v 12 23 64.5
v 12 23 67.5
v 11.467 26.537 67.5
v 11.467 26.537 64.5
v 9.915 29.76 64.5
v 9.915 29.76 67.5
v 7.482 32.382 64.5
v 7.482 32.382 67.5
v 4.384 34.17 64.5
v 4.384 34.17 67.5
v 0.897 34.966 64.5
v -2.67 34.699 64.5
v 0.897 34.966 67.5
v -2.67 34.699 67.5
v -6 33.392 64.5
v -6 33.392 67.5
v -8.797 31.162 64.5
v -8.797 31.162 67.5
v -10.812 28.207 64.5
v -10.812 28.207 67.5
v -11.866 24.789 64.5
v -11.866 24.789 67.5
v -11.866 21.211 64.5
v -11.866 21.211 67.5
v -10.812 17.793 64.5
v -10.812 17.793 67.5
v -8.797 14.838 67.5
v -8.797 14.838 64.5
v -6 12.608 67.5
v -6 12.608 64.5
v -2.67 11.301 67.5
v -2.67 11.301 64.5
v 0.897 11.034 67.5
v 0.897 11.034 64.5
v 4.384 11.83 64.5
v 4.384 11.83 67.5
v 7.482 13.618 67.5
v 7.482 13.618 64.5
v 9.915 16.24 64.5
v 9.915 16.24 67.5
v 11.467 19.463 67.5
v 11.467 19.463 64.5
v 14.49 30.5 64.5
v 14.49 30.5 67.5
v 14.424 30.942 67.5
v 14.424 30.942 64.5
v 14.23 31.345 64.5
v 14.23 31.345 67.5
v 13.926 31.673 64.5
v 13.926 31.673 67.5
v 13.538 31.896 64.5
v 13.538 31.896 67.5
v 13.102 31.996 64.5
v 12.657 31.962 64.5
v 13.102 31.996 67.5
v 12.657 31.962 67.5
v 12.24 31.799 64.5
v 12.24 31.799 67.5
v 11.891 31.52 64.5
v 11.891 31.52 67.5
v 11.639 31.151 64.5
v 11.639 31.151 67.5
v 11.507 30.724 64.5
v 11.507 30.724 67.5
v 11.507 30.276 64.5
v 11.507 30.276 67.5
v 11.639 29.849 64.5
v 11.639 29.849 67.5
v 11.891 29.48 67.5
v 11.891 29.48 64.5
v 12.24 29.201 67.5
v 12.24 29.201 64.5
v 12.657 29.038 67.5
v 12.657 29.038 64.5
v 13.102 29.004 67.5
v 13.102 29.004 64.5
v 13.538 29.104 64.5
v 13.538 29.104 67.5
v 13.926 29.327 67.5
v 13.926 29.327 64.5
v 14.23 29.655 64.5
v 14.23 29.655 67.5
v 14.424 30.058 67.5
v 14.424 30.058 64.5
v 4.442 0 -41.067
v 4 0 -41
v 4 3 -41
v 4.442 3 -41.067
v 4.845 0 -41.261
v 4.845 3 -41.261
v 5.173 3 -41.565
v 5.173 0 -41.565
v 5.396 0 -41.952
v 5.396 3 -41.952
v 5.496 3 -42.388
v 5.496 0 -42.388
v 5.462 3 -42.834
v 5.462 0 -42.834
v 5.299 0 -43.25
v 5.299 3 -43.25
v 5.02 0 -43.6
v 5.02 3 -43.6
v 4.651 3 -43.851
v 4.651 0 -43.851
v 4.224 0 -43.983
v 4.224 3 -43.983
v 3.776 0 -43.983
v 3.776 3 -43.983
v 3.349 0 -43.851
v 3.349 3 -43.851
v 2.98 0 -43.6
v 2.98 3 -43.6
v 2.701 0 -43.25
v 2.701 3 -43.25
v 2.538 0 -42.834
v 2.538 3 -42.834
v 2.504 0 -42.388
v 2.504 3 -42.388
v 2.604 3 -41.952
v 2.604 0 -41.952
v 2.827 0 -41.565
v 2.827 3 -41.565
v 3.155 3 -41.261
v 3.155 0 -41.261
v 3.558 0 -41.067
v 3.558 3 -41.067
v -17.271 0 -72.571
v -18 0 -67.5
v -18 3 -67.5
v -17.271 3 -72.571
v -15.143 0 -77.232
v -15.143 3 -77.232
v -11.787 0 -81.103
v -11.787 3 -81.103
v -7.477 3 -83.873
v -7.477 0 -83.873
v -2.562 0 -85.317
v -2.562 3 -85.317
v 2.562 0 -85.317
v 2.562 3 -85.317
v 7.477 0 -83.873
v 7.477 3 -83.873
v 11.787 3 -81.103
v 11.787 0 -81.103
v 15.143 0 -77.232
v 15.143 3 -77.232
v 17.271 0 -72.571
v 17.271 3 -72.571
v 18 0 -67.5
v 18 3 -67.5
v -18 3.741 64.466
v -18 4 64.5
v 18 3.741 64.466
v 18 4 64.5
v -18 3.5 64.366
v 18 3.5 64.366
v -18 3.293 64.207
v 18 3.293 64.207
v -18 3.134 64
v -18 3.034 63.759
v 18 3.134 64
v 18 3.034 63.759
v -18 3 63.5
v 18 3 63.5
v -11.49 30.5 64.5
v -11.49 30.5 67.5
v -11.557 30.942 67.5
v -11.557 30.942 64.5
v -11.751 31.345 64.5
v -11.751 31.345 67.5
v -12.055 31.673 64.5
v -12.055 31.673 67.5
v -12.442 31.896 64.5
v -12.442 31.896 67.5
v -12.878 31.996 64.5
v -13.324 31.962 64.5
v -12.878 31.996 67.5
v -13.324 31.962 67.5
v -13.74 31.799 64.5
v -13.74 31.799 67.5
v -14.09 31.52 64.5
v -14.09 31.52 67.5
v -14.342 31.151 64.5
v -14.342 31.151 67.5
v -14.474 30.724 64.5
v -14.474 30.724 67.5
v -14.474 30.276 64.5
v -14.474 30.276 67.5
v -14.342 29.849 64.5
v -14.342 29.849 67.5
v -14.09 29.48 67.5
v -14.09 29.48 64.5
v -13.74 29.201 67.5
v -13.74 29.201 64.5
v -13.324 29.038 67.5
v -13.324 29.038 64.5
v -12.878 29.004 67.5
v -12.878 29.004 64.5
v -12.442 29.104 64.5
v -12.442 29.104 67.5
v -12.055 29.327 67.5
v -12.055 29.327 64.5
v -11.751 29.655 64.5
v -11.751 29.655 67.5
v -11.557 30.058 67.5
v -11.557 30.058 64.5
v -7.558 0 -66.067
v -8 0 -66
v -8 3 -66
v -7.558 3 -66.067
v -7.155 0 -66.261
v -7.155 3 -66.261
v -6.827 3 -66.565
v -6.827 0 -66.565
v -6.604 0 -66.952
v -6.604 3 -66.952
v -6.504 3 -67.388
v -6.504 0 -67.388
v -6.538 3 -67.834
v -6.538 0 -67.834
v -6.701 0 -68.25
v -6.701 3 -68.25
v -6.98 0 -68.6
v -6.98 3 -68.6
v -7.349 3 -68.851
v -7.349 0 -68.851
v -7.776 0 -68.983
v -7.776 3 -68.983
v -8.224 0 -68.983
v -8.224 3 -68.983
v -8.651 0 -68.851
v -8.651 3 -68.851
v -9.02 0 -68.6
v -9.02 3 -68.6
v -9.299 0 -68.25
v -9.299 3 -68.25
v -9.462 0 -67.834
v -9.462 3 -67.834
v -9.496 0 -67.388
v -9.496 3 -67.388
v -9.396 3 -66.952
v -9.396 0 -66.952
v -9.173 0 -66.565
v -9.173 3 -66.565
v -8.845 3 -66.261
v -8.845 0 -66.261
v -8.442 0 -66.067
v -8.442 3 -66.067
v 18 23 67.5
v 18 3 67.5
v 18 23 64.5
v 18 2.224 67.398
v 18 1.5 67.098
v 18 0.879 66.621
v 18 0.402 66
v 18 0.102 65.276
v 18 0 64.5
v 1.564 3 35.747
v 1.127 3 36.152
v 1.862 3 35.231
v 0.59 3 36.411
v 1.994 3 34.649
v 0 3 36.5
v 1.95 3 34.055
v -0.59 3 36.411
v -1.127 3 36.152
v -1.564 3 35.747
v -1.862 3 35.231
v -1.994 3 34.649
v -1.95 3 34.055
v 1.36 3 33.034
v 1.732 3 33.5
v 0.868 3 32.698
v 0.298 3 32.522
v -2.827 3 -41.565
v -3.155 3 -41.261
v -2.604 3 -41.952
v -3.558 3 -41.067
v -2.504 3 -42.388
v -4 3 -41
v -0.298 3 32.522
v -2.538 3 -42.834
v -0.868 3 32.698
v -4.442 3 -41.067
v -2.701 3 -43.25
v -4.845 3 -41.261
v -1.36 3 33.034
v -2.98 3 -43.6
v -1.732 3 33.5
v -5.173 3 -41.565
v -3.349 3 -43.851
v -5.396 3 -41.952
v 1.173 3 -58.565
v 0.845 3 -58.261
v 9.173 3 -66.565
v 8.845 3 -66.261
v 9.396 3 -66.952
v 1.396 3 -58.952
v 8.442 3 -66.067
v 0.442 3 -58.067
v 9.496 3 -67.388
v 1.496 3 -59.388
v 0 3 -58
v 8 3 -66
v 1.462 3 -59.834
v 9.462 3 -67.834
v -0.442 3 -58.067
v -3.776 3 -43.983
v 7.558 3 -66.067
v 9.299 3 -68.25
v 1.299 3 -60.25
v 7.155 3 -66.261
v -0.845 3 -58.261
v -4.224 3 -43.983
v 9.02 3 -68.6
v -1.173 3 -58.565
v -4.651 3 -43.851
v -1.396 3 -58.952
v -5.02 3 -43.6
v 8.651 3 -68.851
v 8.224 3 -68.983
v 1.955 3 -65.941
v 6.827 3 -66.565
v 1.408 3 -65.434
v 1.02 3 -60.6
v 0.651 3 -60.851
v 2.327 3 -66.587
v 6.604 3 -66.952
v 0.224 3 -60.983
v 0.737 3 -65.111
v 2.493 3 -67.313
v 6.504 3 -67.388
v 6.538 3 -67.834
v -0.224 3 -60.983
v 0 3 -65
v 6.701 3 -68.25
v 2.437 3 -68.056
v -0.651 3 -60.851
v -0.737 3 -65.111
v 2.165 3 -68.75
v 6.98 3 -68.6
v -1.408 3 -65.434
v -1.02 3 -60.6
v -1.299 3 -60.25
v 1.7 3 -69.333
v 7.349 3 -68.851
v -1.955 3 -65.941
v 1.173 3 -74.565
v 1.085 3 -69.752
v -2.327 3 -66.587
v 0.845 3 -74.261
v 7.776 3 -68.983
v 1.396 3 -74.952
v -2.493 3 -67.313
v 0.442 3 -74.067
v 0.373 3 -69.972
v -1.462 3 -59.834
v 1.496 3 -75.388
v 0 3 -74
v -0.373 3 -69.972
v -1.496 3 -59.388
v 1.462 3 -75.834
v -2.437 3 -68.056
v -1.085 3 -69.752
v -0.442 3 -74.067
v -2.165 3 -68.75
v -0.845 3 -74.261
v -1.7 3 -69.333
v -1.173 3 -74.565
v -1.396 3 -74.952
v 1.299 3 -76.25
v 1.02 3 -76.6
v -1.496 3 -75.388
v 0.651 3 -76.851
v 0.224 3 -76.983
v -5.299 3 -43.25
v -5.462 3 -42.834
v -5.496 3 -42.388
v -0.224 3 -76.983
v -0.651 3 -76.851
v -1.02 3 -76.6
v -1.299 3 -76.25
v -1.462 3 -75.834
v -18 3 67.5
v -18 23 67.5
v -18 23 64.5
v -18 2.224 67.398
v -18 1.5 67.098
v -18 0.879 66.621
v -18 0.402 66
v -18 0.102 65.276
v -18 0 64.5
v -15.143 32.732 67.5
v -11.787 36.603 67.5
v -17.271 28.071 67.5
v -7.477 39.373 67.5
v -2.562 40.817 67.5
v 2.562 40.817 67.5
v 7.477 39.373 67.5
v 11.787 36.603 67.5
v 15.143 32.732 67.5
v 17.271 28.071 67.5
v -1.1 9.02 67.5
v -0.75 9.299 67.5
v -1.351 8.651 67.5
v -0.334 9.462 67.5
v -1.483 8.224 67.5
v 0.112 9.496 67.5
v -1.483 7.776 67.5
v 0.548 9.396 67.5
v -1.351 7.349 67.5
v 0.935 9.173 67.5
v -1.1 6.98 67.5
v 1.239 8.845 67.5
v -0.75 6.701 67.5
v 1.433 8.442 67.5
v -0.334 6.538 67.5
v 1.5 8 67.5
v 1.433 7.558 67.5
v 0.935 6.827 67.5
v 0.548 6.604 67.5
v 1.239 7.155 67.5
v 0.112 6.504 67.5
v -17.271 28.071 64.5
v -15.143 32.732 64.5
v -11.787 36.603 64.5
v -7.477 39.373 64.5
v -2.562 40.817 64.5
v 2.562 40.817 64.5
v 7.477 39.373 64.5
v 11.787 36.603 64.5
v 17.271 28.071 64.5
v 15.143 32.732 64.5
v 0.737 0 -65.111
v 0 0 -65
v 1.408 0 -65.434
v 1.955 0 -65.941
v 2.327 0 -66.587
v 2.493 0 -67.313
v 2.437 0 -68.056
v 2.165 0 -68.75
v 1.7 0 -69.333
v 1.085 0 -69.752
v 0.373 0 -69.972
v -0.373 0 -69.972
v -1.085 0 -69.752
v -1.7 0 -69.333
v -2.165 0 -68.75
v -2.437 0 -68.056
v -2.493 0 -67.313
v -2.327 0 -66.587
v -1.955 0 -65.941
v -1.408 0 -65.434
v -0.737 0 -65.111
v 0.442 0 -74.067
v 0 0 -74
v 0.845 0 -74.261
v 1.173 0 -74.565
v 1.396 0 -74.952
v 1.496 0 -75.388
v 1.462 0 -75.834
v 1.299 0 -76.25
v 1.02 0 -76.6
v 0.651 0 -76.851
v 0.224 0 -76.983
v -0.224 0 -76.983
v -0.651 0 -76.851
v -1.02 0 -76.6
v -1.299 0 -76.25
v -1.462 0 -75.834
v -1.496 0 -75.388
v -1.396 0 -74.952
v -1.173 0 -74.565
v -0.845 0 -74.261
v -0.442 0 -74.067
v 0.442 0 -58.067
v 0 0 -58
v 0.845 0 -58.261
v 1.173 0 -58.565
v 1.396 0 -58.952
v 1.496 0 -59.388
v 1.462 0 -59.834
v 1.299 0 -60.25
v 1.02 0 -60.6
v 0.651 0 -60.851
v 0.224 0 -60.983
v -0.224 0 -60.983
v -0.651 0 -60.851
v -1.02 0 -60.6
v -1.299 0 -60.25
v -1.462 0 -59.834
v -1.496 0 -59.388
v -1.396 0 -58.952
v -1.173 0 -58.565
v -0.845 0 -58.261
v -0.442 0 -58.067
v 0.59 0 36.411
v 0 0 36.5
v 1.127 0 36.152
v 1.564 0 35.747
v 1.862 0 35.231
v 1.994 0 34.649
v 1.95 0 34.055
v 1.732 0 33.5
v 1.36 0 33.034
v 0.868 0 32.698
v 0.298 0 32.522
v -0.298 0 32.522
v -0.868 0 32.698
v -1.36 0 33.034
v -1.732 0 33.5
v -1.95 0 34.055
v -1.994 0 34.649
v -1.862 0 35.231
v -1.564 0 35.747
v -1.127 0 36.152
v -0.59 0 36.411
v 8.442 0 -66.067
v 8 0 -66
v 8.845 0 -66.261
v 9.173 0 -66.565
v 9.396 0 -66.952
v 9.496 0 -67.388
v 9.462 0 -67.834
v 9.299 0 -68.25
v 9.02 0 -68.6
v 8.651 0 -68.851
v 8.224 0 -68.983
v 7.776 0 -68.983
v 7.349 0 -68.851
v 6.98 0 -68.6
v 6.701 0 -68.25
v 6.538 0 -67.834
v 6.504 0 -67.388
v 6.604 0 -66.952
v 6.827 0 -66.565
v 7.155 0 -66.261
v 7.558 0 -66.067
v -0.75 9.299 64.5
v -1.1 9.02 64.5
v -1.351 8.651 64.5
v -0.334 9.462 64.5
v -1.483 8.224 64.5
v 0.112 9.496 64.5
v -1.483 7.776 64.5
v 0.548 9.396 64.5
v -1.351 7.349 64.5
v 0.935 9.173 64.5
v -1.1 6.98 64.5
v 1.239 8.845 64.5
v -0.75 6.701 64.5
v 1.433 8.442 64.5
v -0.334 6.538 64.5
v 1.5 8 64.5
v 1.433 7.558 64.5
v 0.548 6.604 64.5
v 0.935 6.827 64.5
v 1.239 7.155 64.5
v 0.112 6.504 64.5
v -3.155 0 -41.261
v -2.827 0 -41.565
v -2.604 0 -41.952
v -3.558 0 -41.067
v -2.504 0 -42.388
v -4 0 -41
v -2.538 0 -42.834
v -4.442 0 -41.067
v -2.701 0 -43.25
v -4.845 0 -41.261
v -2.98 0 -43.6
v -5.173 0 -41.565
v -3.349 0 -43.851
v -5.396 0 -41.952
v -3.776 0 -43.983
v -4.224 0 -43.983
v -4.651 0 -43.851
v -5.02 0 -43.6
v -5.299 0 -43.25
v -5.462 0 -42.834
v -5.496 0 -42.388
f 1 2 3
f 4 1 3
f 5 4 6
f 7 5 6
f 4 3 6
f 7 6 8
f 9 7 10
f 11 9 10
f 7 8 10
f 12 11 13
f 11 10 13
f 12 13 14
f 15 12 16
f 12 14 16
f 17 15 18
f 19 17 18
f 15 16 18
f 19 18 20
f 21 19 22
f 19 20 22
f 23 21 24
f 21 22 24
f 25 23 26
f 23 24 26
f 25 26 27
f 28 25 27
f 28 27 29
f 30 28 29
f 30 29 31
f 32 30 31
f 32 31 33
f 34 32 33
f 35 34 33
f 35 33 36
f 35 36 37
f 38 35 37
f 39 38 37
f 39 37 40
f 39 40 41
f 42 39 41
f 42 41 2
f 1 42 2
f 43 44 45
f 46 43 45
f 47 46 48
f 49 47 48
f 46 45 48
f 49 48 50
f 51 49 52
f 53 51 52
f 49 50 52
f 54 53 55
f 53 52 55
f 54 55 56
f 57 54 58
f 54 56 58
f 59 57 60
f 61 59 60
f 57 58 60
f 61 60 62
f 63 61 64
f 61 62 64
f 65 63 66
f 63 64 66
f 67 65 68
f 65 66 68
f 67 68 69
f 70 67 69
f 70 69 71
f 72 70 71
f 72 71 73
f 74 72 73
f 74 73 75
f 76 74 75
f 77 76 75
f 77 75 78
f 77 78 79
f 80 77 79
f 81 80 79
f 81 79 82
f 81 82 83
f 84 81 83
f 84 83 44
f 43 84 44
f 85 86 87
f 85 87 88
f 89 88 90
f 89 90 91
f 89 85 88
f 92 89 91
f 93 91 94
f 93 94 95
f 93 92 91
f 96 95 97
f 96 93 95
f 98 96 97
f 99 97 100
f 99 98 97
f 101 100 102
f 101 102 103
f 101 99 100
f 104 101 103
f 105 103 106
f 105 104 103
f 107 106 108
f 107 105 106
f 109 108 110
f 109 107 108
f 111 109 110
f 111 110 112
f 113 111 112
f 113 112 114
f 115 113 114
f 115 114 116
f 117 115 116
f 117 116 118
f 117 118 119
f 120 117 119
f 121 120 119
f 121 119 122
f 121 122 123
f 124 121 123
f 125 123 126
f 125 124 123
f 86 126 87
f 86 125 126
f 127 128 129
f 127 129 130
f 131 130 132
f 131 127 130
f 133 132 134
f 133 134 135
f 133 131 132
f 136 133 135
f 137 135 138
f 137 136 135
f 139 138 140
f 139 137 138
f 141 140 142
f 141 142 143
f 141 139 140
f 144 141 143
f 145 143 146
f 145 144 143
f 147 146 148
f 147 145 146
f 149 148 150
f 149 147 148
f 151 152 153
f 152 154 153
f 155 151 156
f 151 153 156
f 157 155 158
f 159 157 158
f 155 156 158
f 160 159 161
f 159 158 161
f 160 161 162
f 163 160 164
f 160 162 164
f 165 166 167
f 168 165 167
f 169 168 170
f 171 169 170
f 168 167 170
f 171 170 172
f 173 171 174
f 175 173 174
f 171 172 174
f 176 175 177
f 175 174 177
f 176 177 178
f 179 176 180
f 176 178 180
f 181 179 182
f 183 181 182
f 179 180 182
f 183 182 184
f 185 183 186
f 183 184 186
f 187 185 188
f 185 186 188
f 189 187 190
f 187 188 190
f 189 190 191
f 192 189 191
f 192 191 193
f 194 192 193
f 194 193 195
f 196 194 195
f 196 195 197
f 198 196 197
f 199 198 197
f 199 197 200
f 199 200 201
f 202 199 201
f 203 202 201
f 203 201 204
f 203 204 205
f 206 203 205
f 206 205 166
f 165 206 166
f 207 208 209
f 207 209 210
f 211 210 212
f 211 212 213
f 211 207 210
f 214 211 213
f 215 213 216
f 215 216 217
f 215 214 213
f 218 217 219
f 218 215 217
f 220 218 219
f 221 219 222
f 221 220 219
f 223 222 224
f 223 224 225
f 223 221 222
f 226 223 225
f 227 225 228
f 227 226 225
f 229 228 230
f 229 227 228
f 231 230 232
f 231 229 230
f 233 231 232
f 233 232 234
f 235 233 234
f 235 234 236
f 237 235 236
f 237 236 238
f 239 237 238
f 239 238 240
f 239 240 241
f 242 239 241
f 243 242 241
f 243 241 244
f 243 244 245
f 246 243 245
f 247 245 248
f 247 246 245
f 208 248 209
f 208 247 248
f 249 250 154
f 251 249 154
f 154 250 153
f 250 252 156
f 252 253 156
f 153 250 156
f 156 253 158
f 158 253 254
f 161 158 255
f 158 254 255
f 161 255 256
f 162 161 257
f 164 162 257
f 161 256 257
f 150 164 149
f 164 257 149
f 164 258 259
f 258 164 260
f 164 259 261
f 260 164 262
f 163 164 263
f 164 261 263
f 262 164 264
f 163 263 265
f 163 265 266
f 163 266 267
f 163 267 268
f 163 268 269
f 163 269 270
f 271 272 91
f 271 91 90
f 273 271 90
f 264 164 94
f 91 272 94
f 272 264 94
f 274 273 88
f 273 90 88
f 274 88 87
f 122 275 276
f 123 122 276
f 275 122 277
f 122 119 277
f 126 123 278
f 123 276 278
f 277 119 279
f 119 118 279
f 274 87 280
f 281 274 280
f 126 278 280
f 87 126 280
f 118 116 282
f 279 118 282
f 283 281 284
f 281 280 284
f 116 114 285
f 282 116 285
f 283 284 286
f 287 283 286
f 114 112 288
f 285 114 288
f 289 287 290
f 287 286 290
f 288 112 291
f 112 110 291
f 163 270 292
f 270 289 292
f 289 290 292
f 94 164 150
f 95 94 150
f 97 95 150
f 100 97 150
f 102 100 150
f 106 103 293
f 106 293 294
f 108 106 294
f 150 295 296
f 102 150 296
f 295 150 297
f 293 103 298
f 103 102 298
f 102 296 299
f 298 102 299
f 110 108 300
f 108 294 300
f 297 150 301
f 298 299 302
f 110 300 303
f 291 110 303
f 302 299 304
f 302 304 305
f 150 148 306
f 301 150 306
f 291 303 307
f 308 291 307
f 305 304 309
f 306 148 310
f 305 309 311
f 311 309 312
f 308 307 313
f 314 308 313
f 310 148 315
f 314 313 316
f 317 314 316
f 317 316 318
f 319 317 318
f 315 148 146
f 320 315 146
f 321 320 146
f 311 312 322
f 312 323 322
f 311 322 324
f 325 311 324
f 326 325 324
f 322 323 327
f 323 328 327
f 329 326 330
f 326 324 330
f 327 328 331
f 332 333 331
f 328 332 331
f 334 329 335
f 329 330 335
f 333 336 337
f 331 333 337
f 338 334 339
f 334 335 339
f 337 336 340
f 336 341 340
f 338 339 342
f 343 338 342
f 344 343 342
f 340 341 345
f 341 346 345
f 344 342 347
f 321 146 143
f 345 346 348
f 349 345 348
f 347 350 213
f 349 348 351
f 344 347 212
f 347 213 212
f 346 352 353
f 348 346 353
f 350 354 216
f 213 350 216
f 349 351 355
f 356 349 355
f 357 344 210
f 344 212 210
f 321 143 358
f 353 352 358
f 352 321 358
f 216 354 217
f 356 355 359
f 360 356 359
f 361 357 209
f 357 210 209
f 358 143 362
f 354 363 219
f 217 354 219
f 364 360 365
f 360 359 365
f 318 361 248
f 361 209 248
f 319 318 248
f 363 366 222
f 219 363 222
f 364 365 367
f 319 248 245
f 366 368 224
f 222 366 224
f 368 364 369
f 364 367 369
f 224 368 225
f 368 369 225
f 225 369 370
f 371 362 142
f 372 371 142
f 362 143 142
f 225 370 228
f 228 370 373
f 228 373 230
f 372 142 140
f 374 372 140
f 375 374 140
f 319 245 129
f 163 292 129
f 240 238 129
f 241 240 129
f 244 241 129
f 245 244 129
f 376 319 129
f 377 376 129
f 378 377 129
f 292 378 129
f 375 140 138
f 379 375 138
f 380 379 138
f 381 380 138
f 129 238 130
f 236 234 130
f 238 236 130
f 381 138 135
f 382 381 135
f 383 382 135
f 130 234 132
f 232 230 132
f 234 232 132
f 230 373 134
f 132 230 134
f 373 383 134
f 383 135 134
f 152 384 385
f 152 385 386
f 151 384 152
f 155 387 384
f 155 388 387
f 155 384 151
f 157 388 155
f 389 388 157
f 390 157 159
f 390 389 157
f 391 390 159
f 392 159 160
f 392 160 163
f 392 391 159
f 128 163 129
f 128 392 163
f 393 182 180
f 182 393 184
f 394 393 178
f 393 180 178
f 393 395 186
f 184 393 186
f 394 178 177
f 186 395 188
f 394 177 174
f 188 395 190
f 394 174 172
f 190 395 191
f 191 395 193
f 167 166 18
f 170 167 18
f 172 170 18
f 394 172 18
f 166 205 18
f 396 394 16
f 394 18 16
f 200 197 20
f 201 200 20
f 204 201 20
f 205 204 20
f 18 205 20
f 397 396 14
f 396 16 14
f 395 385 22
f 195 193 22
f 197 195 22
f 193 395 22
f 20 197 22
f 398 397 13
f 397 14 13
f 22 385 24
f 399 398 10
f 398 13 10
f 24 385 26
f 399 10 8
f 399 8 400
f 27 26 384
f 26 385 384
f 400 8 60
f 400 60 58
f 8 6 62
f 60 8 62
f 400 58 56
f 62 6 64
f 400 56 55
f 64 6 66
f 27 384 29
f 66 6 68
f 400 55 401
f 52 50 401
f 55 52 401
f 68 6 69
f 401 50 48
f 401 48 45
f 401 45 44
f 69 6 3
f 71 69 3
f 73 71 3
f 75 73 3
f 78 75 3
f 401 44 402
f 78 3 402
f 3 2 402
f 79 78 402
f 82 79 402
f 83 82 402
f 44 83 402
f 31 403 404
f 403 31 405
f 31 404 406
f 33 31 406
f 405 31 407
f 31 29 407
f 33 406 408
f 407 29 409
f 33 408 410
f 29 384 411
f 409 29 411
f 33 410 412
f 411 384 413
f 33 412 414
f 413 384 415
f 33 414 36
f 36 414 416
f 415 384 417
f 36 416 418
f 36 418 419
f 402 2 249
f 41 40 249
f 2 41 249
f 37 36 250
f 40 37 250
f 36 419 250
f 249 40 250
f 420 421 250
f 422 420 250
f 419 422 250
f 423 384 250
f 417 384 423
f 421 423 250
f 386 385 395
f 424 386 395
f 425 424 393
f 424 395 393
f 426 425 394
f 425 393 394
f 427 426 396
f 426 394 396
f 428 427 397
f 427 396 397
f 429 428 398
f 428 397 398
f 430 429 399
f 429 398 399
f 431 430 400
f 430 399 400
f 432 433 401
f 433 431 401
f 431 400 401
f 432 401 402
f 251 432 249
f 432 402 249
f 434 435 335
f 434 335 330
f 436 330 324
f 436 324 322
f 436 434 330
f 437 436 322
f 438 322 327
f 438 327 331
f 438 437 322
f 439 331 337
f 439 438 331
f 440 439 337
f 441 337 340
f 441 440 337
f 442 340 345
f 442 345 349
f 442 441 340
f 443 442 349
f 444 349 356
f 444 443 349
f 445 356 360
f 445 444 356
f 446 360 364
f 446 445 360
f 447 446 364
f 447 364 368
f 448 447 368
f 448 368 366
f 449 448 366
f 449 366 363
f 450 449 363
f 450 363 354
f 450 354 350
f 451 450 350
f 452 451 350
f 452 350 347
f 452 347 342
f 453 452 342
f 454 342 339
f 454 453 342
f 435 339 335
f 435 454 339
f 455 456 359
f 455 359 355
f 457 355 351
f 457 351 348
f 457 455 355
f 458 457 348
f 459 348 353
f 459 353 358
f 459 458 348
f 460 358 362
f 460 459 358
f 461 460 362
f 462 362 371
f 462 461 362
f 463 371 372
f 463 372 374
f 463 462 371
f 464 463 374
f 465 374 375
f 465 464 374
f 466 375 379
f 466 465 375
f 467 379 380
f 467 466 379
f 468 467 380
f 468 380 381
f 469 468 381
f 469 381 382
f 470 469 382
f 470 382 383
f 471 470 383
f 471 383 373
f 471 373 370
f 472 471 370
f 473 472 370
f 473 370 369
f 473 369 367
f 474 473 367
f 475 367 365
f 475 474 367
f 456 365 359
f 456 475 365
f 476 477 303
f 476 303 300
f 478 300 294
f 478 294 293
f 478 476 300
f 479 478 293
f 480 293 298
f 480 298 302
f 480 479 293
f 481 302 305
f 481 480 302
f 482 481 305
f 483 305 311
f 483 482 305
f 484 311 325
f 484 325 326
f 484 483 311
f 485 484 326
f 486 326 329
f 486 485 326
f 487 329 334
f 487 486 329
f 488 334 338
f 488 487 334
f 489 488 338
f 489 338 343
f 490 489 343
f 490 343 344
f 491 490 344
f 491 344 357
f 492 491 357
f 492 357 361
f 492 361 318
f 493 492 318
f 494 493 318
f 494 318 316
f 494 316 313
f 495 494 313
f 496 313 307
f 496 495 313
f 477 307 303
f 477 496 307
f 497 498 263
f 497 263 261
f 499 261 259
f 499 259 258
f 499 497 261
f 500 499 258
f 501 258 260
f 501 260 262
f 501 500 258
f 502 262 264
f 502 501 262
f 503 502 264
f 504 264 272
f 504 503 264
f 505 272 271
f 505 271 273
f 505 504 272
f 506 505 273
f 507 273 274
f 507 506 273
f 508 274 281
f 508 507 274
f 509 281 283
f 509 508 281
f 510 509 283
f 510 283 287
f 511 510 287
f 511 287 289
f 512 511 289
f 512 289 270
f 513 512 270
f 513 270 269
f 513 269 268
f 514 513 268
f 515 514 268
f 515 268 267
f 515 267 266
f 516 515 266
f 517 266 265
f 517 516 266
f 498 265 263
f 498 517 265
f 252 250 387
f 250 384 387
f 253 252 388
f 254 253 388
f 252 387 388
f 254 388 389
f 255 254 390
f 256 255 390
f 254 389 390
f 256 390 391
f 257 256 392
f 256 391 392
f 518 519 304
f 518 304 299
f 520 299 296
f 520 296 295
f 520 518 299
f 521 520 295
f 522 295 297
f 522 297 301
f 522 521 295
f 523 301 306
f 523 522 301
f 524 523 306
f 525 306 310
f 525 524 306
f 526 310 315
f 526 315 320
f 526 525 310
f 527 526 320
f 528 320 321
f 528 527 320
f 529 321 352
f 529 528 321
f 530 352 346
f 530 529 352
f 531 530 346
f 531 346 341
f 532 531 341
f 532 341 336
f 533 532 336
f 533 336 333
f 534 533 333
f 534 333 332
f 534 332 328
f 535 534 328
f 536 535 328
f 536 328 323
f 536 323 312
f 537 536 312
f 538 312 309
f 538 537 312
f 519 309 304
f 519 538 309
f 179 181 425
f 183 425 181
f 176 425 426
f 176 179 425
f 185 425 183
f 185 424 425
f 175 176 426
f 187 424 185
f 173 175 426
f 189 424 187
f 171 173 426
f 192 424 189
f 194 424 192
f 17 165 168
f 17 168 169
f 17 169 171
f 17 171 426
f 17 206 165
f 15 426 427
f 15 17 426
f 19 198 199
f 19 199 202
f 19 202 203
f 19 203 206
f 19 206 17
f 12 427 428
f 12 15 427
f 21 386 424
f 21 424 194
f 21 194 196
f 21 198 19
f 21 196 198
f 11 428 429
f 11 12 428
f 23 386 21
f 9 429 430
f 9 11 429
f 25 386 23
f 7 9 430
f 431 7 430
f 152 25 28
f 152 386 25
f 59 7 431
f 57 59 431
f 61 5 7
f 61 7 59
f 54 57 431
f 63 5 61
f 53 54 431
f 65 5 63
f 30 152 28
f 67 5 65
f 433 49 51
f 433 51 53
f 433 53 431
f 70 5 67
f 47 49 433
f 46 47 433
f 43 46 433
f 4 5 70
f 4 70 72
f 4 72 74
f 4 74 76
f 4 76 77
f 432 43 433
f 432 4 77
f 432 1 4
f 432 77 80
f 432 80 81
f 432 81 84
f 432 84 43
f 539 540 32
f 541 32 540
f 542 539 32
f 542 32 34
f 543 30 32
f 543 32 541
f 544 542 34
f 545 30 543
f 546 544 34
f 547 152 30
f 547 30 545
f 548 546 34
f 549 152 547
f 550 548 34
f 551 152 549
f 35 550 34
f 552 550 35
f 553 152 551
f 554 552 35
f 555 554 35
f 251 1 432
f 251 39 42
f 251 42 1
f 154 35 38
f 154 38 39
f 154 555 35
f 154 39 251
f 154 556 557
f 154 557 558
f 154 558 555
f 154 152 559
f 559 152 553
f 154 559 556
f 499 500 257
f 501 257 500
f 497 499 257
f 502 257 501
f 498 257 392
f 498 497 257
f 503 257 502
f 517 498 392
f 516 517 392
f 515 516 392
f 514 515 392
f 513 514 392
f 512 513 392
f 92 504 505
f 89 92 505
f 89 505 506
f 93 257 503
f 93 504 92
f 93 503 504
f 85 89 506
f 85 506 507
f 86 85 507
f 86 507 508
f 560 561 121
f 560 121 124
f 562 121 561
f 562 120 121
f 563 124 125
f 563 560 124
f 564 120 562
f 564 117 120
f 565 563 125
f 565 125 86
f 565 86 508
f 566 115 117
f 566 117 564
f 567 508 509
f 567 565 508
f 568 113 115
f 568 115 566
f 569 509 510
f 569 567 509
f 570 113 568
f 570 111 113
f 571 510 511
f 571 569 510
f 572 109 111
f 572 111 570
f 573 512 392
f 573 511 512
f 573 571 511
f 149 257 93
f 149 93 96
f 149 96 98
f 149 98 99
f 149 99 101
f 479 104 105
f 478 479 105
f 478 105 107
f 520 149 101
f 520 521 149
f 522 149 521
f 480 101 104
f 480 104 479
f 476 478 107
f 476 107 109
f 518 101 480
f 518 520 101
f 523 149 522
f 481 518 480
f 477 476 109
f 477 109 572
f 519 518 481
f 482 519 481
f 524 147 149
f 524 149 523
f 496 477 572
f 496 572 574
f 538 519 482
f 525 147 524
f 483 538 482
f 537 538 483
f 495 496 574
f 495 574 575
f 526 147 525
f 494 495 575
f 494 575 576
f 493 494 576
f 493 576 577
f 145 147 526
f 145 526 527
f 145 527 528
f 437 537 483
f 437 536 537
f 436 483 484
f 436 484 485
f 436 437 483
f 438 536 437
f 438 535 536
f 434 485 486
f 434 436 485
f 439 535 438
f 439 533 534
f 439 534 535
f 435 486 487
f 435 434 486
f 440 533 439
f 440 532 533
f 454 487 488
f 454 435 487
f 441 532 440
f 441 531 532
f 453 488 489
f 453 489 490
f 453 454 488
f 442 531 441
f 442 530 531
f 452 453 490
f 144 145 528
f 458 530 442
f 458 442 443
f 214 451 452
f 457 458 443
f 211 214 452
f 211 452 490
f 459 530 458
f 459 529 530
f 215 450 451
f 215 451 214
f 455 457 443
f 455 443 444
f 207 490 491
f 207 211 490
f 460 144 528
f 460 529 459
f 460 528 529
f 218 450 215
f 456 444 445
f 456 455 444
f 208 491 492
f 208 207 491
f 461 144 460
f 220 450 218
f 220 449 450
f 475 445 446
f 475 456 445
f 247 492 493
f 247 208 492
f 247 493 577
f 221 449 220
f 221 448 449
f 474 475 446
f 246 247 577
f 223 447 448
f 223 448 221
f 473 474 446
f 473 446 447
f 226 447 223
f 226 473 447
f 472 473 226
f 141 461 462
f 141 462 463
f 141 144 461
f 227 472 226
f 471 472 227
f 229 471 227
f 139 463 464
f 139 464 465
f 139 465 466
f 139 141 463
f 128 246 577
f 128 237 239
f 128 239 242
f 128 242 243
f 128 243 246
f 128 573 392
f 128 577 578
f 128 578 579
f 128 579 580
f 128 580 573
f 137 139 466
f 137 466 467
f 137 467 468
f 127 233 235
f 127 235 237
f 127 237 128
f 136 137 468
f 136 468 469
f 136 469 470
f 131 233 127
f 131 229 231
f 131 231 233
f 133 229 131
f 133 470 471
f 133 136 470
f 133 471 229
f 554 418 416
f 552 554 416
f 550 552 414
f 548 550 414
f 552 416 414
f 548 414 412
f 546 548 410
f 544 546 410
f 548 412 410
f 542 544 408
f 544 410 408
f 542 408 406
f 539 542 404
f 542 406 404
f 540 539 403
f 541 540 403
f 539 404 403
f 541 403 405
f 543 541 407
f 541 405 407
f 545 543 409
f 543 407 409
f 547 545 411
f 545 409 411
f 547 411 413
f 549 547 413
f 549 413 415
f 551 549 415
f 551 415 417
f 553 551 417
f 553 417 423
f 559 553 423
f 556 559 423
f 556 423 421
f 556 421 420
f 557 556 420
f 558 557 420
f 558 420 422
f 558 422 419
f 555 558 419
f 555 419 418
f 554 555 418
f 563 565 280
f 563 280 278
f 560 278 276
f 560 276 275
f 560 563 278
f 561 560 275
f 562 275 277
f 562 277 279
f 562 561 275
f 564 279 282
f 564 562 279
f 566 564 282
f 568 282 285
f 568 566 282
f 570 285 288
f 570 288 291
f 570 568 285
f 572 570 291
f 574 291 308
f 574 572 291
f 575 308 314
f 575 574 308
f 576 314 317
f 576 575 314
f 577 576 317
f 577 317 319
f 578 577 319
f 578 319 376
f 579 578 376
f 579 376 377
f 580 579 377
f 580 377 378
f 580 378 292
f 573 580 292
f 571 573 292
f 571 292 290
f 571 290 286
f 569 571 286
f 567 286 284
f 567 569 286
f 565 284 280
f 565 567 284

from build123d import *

# Parameters (mm, degrees)
SKETCH_1_R          = 1.5
SKETCH_1_R_2        = 2.5
SKETCH_1_R_3        = 2
EXTRUDE_1_DEPTH     = 3
SKETCH_2_W          = 36
SKETCH_2_H          = 3
EXTRUDE_2_DEPTH     = 41
CUT_EXTRUDE_1_DEPTH = 4
SKETCH_5_R          = 1.5
SKETCH_5_R_2        = 12
CUT_EXTRUDE_2_DEPTH = 4
FILLET_1_R          = 3
FILLET_2_R          = 1


with BuildPart() as part:
    # 草图1 → 凸台-拉伸1 (new body)
    with BuildSketch(Plane(origin=(0, 0, 0), x_dir=(1, 0, 0), z_dir=(0, 1, 0))):
        with BuildLine():
            Line((18, -67.5), (-18, -67.5))
            Line((-18, -67.5), (-18, 67.5))
            ThreePointArc((-18, 67.5), (0, 85.5), (18, 67.5))
            Line((18, 67.5), (18, -67.5))
        make_face()
        with Locations(Location((0, 75.5, 0), (0, 0, 270))):
            Circle(SKETCH_1_R, mode=Mode.SUBTRACT)
        with Locations(Location((0, 59.5, 0), (0, 0, 270))):
            Circle(SKETCH_1_R, mode=Mode.SUBTRACT)
        with Locations(Location((-8, 67.5, 0), (0, 0, 270))):
            Circle(SKETCH_1_R, mode=Mode.SUBTRACT)
        with Locations(Location((8, 67.5, 0), (0, 0, 270))):
            Circle(SKETCH_1_R, mode=Mode.SUBTRACT)
        with Locations(Location((0, 67.5, 0), (0, 0, 270))):
            Circle(SKETCH_1_R_2, mode=Mode.SUBTRACT)
        with Locations(Location((-4, 42.5, 0), (0, 0, 270))):
            Circle(SKETCH_1_R, mode=Mode.SUBTRACT)
        with Locations(Location((4, 42.5, 0), (0, 0, 270))):
            Circle(SKETCH_1_R, mode=Mode.SUBTRACT)
        with Locations(Location((0, -34.5, 0), (0, 0, 270))):
            Circle(SKETCH_1_R_3, mode=Mode.SUBTRACT)
    extrude(amount=EXTRUDE_1_DEPTH)

    # 草图2 → 凸台-拉伸2 (add)
    with BuildSketch(Plane(origin=(0, 3, 0), x_dir=(1, 0, 0), z_dir=(0, 1, 0))):
        with Locations((0, -66)):
            Rectangle(SKETCH_2_W, SKETCH_2_H)
    extrude(amount=EXTRUDE_2_DEPTH)

    # 草图3 → 切除-拉伸1 (cut)
    with BuildSketch(Plane.XY.offset(67.5)):
        with BuildLine():
            Line((-18, 44), (-18, 23))
            ThreePointArc((-18, 23), (0, 41), (18, 23))
            Line((18, 23), (18, 44))
            Line((18, 44), (-18, 44))
        make_face()
    extrude(amount=-CUT_EXTRUDE_1_DEPTH, mode=Mode.SUBTRACT)

    # 草图5 → 切除-拉伸2 (cut)
    with BuildSketch(Plane.XY.offset(67.5)):
        with Locations((0, 8)):
            Circle(SKETCH_5_R)
        with Locations((-12.990381057, 30.5)):
            Circle(SKETCH_5_R)
        with Locations((12.990381057, 30.5)):
            Circle(SKETCH_5_R)
        with Locations((0, 23)):
            Circle(SKETCH_5_R_2)
    extrude(amount=-CUT_EXTRUDE_2_DEPTH, mode=Mode.SUBTRACT)

    # 圆角1
    fillet_1_edges = [part.edges().sort_by_distance(p)[0] for p in [
        (0, 0, 67.5),
    ]]
    fillet(fillet_1_edges, radius=FILLET_1_R)

    # 圆角2
    fillet_2_edges = [part.edges().sort_by_distance(p)[0] for p in [
        (0, 3, 64.5),
    ]]
    fillet(fillet_2_edges, radius=FILLET_2_R)


solid = part.part
